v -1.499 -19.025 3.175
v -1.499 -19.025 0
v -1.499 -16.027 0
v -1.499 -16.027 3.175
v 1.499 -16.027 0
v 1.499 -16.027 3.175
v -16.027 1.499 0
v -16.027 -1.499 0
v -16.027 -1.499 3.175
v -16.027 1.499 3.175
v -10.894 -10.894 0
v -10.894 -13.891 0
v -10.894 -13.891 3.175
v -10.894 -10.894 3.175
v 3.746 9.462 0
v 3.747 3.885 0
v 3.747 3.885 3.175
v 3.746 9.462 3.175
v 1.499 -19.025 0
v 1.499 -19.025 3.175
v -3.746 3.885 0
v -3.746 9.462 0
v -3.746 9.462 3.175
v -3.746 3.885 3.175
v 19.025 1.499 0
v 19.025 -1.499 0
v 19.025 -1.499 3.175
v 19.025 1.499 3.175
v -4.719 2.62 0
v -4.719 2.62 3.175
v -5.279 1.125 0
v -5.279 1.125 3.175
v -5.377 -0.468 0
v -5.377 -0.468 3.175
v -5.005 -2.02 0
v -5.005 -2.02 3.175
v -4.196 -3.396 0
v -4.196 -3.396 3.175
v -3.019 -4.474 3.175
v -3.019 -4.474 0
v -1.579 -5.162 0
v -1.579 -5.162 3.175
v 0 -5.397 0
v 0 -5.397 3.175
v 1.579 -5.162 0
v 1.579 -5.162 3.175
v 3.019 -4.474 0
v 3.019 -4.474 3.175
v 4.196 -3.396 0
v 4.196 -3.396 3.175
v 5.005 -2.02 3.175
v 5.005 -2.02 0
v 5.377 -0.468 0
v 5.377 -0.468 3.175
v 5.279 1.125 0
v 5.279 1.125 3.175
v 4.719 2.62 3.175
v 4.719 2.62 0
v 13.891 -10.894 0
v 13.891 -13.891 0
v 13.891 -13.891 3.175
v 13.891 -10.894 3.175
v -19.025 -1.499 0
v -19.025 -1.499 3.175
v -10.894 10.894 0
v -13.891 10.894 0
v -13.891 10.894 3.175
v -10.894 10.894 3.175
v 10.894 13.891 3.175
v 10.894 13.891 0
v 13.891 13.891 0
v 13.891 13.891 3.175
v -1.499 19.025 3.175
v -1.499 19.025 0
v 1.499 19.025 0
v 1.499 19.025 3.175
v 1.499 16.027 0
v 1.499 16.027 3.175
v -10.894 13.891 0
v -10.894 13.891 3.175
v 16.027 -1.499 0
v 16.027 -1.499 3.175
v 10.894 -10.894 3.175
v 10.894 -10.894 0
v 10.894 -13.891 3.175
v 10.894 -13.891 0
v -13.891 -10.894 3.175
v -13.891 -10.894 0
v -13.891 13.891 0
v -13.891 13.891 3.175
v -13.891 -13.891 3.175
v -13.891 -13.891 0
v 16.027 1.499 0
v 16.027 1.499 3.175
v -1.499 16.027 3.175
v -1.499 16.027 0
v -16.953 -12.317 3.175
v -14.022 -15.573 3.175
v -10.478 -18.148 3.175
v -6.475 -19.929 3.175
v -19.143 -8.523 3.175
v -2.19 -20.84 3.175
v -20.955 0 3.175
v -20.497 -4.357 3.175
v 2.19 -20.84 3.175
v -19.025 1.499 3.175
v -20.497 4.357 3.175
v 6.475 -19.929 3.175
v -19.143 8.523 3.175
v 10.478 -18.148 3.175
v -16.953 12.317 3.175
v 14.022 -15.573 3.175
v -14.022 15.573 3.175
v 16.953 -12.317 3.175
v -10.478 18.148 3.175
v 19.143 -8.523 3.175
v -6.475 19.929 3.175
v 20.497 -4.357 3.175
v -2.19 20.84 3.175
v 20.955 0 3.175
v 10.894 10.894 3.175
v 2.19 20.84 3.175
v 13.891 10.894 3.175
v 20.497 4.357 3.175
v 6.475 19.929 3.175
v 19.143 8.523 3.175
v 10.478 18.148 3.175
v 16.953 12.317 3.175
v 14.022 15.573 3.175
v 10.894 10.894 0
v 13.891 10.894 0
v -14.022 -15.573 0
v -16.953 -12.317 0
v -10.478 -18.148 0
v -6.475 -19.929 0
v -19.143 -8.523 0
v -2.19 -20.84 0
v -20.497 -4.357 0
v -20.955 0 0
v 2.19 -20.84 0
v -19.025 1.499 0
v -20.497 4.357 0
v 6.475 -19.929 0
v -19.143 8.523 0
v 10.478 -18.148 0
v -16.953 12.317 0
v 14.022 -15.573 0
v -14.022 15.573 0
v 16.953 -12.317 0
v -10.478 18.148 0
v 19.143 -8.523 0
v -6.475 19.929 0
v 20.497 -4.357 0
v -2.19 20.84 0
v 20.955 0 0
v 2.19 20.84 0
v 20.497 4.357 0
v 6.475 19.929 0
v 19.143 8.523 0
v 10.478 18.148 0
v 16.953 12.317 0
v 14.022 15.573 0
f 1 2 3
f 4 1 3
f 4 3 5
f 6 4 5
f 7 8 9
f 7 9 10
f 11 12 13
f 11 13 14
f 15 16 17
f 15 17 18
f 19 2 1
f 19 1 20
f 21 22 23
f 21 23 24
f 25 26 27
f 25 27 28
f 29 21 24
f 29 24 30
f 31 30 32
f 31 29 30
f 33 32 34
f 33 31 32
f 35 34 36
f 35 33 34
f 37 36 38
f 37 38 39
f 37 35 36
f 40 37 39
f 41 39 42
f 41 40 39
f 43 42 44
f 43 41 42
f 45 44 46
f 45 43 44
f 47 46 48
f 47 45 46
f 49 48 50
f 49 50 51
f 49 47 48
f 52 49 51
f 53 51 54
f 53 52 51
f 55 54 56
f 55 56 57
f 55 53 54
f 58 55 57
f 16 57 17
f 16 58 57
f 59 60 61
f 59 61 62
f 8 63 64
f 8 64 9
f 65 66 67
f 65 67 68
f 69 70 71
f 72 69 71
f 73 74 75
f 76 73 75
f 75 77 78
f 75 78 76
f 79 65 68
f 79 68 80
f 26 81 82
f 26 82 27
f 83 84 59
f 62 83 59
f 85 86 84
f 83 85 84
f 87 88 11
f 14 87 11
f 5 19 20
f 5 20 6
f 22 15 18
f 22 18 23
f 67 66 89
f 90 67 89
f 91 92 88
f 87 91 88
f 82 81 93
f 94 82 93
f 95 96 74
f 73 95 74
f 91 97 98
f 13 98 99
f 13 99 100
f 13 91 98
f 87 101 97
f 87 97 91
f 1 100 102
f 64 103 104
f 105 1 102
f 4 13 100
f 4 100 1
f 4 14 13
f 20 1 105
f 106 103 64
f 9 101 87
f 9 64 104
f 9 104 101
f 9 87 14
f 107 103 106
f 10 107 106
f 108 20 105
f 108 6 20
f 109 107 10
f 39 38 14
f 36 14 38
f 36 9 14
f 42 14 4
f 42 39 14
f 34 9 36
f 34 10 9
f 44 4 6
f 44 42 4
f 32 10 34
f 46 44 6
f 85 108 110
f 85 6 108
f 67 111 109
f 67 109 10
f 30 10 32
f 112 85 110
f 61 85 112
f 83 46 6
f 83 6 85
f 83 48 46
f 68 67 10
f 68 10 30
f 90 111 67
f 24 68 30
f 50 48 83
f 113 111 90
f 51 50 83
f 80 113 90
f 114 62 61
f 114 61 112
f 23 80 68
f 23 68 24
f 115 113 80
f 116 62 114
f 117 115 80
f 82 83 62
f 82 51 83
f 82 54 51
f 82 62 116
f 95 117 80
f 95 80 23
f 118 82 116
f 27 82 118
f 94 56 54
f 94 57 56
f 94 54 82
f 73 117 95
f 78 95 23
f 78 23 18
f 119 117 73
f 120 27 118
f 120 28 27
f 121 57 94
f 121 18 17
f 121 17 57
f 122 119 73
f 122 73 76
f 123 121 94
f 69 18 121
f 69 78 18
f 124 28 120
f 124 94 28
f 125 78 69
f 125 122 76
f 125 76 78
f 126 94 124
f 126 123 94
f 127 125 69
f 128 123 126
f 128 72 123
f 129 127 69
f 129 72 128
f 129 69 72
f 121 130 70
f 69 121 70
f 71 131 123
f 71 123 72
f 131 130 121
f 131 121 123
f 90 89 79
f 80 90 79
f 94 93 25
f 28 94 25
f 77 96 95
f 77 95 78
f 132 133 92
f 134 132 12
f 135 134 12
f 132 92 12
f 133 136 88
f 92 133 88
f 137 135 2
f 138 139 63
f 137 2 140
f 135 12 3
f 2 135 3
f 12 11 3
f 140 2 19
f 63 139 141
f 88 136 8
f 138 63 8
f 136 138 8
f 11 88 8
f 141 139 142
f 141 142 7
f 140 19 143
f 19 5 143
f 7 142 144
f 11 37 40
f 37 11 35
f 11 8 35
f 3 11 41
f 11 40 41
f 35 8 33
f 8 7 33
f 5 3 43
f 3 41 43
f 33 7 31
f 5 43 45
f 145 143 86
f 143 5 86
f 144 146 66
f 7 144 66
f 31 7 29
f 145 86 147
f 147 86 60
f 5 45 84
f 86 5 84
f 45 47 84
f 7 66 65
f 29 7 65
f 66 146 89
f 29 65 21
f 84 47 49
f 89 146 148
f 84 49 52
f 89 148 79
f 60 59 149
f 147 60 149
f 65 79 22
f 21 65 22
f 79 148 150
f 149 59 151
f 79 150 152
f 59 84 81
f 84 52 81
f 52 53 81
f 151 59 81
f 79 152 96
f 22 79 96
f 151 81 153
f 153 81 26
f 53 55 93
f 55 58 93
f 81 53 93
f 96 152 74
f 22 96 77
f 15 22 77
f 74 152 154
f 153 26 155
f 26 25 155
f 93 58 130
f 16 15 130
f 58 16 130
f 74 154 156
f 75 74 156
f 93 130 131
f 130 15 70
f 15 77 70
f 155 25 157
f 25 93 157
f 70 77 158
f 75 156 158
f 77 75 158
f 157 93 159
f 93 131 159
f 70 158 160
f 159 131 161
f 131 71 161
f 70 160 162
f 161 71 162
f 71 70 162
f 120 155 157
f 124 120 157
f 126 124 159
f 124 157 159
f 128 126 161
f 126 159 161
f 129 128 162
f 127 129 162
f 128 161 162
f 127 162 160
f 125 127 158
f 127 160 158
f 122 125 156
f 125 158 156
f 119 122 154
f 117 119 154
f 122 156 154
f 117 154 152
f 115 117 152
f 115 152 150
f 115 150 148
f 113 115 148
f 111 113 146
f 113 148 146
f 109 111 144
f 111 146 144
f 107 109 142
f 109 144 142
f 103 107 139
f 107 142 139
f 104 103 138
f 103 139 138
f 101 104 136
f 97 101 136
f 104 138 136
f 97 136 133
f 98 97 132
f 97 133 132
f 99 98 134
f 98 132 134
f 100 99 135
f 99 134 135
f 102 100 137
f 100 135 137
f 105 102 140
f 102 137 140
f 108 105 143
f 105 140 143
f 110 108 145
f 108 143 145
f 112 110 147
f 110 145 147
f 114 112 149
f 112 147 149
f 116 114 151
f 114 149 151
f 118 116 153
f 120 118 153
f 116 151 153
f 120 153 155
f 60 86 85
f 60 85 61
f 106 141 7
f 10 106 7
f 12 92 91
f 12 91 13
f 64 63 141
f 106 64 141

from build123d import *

# Parameters (mm, degrees)
SKETCH1_R           = 20.955
SKETCH1_W           = 2.9972
SKETCH1_H           = 2.9972
BOSS_EXTRUDE1_DEPTH = 3.175
CUT_EXTRUDE1_DEPTH  = 3.175


# Read off the part's stored shape, not the designer's step: Cut-Extrude1
with BuildPart() as part:
    # Sketch1 → Boss-Extrude1 (new body)
    with BuildSketch(Plane.XY):
        Circle(SKETCH1_R)
        with Locations((0, 17.526)):
            Rectangle(SKETCH1_W, SKETCH1_H, mode=Mode.SUBTRACT)
        with Locations((0, -17.526)):
            Rectangle(SKETCH1_W, SKETCH1_H, mode=Mode.SUBTRACT)
        with Locations((17.526, 0)):
            Rectangle(SKETCH1_W, SKETCH1_H, mode=Mode.SUBTRACT)
        with Locations((-17.526, 0)):
            Rectangle(SKETCH1_W, SKETCH1_H, mode=Mode.SUBTRACT)
        with Locations((12.392753447, 12.392753447)):
            Rectangle(SKETCH1_W, SKETCH1_H, mode=Mode.SUBTRACT)
        with Locations((-12.392753447, 12.392753447)):
            Rectangle(SKETCH1_W, SKETCH1_H, mode=Mode.SUBTRACT)
        with Locations((-12.392753447, -12.392753447)):
            Rectangle(SKETCH1_W, SKETCH1_H, mode=Mode.SUBTRACT)
        with Locations((12.392753447, -12.392753447)):
            Rectangle(SKETCH1_W, SKETCH1_H, mode=Mode.SUBTRACT)
    extrude(amount=BOSS_EXTRUDE1_DEPTH)

    # Cut-Extrude1 outline → Cut-Extrude1 (cut)
    with BuildSketch(Plane.XY):
        with BuildLine():
            Line((-3.7465, 9.4615), (-3.7465, 3.885452869))
            ThreePointArc((-3.7465, 3.885452869), (0, -5.3975), (3.7465, 3.885452869))
            Line((3.7465, 3.885452869), (3.7465, 9.4615))
            Line((3.7465, 9.4615), (-3.7465, 9.4615))
        make_face()
    extrude(amount=CUT_EXTRUDE1_DEPTH, mode=Mode.SUBTRACT)


solid = part.part
